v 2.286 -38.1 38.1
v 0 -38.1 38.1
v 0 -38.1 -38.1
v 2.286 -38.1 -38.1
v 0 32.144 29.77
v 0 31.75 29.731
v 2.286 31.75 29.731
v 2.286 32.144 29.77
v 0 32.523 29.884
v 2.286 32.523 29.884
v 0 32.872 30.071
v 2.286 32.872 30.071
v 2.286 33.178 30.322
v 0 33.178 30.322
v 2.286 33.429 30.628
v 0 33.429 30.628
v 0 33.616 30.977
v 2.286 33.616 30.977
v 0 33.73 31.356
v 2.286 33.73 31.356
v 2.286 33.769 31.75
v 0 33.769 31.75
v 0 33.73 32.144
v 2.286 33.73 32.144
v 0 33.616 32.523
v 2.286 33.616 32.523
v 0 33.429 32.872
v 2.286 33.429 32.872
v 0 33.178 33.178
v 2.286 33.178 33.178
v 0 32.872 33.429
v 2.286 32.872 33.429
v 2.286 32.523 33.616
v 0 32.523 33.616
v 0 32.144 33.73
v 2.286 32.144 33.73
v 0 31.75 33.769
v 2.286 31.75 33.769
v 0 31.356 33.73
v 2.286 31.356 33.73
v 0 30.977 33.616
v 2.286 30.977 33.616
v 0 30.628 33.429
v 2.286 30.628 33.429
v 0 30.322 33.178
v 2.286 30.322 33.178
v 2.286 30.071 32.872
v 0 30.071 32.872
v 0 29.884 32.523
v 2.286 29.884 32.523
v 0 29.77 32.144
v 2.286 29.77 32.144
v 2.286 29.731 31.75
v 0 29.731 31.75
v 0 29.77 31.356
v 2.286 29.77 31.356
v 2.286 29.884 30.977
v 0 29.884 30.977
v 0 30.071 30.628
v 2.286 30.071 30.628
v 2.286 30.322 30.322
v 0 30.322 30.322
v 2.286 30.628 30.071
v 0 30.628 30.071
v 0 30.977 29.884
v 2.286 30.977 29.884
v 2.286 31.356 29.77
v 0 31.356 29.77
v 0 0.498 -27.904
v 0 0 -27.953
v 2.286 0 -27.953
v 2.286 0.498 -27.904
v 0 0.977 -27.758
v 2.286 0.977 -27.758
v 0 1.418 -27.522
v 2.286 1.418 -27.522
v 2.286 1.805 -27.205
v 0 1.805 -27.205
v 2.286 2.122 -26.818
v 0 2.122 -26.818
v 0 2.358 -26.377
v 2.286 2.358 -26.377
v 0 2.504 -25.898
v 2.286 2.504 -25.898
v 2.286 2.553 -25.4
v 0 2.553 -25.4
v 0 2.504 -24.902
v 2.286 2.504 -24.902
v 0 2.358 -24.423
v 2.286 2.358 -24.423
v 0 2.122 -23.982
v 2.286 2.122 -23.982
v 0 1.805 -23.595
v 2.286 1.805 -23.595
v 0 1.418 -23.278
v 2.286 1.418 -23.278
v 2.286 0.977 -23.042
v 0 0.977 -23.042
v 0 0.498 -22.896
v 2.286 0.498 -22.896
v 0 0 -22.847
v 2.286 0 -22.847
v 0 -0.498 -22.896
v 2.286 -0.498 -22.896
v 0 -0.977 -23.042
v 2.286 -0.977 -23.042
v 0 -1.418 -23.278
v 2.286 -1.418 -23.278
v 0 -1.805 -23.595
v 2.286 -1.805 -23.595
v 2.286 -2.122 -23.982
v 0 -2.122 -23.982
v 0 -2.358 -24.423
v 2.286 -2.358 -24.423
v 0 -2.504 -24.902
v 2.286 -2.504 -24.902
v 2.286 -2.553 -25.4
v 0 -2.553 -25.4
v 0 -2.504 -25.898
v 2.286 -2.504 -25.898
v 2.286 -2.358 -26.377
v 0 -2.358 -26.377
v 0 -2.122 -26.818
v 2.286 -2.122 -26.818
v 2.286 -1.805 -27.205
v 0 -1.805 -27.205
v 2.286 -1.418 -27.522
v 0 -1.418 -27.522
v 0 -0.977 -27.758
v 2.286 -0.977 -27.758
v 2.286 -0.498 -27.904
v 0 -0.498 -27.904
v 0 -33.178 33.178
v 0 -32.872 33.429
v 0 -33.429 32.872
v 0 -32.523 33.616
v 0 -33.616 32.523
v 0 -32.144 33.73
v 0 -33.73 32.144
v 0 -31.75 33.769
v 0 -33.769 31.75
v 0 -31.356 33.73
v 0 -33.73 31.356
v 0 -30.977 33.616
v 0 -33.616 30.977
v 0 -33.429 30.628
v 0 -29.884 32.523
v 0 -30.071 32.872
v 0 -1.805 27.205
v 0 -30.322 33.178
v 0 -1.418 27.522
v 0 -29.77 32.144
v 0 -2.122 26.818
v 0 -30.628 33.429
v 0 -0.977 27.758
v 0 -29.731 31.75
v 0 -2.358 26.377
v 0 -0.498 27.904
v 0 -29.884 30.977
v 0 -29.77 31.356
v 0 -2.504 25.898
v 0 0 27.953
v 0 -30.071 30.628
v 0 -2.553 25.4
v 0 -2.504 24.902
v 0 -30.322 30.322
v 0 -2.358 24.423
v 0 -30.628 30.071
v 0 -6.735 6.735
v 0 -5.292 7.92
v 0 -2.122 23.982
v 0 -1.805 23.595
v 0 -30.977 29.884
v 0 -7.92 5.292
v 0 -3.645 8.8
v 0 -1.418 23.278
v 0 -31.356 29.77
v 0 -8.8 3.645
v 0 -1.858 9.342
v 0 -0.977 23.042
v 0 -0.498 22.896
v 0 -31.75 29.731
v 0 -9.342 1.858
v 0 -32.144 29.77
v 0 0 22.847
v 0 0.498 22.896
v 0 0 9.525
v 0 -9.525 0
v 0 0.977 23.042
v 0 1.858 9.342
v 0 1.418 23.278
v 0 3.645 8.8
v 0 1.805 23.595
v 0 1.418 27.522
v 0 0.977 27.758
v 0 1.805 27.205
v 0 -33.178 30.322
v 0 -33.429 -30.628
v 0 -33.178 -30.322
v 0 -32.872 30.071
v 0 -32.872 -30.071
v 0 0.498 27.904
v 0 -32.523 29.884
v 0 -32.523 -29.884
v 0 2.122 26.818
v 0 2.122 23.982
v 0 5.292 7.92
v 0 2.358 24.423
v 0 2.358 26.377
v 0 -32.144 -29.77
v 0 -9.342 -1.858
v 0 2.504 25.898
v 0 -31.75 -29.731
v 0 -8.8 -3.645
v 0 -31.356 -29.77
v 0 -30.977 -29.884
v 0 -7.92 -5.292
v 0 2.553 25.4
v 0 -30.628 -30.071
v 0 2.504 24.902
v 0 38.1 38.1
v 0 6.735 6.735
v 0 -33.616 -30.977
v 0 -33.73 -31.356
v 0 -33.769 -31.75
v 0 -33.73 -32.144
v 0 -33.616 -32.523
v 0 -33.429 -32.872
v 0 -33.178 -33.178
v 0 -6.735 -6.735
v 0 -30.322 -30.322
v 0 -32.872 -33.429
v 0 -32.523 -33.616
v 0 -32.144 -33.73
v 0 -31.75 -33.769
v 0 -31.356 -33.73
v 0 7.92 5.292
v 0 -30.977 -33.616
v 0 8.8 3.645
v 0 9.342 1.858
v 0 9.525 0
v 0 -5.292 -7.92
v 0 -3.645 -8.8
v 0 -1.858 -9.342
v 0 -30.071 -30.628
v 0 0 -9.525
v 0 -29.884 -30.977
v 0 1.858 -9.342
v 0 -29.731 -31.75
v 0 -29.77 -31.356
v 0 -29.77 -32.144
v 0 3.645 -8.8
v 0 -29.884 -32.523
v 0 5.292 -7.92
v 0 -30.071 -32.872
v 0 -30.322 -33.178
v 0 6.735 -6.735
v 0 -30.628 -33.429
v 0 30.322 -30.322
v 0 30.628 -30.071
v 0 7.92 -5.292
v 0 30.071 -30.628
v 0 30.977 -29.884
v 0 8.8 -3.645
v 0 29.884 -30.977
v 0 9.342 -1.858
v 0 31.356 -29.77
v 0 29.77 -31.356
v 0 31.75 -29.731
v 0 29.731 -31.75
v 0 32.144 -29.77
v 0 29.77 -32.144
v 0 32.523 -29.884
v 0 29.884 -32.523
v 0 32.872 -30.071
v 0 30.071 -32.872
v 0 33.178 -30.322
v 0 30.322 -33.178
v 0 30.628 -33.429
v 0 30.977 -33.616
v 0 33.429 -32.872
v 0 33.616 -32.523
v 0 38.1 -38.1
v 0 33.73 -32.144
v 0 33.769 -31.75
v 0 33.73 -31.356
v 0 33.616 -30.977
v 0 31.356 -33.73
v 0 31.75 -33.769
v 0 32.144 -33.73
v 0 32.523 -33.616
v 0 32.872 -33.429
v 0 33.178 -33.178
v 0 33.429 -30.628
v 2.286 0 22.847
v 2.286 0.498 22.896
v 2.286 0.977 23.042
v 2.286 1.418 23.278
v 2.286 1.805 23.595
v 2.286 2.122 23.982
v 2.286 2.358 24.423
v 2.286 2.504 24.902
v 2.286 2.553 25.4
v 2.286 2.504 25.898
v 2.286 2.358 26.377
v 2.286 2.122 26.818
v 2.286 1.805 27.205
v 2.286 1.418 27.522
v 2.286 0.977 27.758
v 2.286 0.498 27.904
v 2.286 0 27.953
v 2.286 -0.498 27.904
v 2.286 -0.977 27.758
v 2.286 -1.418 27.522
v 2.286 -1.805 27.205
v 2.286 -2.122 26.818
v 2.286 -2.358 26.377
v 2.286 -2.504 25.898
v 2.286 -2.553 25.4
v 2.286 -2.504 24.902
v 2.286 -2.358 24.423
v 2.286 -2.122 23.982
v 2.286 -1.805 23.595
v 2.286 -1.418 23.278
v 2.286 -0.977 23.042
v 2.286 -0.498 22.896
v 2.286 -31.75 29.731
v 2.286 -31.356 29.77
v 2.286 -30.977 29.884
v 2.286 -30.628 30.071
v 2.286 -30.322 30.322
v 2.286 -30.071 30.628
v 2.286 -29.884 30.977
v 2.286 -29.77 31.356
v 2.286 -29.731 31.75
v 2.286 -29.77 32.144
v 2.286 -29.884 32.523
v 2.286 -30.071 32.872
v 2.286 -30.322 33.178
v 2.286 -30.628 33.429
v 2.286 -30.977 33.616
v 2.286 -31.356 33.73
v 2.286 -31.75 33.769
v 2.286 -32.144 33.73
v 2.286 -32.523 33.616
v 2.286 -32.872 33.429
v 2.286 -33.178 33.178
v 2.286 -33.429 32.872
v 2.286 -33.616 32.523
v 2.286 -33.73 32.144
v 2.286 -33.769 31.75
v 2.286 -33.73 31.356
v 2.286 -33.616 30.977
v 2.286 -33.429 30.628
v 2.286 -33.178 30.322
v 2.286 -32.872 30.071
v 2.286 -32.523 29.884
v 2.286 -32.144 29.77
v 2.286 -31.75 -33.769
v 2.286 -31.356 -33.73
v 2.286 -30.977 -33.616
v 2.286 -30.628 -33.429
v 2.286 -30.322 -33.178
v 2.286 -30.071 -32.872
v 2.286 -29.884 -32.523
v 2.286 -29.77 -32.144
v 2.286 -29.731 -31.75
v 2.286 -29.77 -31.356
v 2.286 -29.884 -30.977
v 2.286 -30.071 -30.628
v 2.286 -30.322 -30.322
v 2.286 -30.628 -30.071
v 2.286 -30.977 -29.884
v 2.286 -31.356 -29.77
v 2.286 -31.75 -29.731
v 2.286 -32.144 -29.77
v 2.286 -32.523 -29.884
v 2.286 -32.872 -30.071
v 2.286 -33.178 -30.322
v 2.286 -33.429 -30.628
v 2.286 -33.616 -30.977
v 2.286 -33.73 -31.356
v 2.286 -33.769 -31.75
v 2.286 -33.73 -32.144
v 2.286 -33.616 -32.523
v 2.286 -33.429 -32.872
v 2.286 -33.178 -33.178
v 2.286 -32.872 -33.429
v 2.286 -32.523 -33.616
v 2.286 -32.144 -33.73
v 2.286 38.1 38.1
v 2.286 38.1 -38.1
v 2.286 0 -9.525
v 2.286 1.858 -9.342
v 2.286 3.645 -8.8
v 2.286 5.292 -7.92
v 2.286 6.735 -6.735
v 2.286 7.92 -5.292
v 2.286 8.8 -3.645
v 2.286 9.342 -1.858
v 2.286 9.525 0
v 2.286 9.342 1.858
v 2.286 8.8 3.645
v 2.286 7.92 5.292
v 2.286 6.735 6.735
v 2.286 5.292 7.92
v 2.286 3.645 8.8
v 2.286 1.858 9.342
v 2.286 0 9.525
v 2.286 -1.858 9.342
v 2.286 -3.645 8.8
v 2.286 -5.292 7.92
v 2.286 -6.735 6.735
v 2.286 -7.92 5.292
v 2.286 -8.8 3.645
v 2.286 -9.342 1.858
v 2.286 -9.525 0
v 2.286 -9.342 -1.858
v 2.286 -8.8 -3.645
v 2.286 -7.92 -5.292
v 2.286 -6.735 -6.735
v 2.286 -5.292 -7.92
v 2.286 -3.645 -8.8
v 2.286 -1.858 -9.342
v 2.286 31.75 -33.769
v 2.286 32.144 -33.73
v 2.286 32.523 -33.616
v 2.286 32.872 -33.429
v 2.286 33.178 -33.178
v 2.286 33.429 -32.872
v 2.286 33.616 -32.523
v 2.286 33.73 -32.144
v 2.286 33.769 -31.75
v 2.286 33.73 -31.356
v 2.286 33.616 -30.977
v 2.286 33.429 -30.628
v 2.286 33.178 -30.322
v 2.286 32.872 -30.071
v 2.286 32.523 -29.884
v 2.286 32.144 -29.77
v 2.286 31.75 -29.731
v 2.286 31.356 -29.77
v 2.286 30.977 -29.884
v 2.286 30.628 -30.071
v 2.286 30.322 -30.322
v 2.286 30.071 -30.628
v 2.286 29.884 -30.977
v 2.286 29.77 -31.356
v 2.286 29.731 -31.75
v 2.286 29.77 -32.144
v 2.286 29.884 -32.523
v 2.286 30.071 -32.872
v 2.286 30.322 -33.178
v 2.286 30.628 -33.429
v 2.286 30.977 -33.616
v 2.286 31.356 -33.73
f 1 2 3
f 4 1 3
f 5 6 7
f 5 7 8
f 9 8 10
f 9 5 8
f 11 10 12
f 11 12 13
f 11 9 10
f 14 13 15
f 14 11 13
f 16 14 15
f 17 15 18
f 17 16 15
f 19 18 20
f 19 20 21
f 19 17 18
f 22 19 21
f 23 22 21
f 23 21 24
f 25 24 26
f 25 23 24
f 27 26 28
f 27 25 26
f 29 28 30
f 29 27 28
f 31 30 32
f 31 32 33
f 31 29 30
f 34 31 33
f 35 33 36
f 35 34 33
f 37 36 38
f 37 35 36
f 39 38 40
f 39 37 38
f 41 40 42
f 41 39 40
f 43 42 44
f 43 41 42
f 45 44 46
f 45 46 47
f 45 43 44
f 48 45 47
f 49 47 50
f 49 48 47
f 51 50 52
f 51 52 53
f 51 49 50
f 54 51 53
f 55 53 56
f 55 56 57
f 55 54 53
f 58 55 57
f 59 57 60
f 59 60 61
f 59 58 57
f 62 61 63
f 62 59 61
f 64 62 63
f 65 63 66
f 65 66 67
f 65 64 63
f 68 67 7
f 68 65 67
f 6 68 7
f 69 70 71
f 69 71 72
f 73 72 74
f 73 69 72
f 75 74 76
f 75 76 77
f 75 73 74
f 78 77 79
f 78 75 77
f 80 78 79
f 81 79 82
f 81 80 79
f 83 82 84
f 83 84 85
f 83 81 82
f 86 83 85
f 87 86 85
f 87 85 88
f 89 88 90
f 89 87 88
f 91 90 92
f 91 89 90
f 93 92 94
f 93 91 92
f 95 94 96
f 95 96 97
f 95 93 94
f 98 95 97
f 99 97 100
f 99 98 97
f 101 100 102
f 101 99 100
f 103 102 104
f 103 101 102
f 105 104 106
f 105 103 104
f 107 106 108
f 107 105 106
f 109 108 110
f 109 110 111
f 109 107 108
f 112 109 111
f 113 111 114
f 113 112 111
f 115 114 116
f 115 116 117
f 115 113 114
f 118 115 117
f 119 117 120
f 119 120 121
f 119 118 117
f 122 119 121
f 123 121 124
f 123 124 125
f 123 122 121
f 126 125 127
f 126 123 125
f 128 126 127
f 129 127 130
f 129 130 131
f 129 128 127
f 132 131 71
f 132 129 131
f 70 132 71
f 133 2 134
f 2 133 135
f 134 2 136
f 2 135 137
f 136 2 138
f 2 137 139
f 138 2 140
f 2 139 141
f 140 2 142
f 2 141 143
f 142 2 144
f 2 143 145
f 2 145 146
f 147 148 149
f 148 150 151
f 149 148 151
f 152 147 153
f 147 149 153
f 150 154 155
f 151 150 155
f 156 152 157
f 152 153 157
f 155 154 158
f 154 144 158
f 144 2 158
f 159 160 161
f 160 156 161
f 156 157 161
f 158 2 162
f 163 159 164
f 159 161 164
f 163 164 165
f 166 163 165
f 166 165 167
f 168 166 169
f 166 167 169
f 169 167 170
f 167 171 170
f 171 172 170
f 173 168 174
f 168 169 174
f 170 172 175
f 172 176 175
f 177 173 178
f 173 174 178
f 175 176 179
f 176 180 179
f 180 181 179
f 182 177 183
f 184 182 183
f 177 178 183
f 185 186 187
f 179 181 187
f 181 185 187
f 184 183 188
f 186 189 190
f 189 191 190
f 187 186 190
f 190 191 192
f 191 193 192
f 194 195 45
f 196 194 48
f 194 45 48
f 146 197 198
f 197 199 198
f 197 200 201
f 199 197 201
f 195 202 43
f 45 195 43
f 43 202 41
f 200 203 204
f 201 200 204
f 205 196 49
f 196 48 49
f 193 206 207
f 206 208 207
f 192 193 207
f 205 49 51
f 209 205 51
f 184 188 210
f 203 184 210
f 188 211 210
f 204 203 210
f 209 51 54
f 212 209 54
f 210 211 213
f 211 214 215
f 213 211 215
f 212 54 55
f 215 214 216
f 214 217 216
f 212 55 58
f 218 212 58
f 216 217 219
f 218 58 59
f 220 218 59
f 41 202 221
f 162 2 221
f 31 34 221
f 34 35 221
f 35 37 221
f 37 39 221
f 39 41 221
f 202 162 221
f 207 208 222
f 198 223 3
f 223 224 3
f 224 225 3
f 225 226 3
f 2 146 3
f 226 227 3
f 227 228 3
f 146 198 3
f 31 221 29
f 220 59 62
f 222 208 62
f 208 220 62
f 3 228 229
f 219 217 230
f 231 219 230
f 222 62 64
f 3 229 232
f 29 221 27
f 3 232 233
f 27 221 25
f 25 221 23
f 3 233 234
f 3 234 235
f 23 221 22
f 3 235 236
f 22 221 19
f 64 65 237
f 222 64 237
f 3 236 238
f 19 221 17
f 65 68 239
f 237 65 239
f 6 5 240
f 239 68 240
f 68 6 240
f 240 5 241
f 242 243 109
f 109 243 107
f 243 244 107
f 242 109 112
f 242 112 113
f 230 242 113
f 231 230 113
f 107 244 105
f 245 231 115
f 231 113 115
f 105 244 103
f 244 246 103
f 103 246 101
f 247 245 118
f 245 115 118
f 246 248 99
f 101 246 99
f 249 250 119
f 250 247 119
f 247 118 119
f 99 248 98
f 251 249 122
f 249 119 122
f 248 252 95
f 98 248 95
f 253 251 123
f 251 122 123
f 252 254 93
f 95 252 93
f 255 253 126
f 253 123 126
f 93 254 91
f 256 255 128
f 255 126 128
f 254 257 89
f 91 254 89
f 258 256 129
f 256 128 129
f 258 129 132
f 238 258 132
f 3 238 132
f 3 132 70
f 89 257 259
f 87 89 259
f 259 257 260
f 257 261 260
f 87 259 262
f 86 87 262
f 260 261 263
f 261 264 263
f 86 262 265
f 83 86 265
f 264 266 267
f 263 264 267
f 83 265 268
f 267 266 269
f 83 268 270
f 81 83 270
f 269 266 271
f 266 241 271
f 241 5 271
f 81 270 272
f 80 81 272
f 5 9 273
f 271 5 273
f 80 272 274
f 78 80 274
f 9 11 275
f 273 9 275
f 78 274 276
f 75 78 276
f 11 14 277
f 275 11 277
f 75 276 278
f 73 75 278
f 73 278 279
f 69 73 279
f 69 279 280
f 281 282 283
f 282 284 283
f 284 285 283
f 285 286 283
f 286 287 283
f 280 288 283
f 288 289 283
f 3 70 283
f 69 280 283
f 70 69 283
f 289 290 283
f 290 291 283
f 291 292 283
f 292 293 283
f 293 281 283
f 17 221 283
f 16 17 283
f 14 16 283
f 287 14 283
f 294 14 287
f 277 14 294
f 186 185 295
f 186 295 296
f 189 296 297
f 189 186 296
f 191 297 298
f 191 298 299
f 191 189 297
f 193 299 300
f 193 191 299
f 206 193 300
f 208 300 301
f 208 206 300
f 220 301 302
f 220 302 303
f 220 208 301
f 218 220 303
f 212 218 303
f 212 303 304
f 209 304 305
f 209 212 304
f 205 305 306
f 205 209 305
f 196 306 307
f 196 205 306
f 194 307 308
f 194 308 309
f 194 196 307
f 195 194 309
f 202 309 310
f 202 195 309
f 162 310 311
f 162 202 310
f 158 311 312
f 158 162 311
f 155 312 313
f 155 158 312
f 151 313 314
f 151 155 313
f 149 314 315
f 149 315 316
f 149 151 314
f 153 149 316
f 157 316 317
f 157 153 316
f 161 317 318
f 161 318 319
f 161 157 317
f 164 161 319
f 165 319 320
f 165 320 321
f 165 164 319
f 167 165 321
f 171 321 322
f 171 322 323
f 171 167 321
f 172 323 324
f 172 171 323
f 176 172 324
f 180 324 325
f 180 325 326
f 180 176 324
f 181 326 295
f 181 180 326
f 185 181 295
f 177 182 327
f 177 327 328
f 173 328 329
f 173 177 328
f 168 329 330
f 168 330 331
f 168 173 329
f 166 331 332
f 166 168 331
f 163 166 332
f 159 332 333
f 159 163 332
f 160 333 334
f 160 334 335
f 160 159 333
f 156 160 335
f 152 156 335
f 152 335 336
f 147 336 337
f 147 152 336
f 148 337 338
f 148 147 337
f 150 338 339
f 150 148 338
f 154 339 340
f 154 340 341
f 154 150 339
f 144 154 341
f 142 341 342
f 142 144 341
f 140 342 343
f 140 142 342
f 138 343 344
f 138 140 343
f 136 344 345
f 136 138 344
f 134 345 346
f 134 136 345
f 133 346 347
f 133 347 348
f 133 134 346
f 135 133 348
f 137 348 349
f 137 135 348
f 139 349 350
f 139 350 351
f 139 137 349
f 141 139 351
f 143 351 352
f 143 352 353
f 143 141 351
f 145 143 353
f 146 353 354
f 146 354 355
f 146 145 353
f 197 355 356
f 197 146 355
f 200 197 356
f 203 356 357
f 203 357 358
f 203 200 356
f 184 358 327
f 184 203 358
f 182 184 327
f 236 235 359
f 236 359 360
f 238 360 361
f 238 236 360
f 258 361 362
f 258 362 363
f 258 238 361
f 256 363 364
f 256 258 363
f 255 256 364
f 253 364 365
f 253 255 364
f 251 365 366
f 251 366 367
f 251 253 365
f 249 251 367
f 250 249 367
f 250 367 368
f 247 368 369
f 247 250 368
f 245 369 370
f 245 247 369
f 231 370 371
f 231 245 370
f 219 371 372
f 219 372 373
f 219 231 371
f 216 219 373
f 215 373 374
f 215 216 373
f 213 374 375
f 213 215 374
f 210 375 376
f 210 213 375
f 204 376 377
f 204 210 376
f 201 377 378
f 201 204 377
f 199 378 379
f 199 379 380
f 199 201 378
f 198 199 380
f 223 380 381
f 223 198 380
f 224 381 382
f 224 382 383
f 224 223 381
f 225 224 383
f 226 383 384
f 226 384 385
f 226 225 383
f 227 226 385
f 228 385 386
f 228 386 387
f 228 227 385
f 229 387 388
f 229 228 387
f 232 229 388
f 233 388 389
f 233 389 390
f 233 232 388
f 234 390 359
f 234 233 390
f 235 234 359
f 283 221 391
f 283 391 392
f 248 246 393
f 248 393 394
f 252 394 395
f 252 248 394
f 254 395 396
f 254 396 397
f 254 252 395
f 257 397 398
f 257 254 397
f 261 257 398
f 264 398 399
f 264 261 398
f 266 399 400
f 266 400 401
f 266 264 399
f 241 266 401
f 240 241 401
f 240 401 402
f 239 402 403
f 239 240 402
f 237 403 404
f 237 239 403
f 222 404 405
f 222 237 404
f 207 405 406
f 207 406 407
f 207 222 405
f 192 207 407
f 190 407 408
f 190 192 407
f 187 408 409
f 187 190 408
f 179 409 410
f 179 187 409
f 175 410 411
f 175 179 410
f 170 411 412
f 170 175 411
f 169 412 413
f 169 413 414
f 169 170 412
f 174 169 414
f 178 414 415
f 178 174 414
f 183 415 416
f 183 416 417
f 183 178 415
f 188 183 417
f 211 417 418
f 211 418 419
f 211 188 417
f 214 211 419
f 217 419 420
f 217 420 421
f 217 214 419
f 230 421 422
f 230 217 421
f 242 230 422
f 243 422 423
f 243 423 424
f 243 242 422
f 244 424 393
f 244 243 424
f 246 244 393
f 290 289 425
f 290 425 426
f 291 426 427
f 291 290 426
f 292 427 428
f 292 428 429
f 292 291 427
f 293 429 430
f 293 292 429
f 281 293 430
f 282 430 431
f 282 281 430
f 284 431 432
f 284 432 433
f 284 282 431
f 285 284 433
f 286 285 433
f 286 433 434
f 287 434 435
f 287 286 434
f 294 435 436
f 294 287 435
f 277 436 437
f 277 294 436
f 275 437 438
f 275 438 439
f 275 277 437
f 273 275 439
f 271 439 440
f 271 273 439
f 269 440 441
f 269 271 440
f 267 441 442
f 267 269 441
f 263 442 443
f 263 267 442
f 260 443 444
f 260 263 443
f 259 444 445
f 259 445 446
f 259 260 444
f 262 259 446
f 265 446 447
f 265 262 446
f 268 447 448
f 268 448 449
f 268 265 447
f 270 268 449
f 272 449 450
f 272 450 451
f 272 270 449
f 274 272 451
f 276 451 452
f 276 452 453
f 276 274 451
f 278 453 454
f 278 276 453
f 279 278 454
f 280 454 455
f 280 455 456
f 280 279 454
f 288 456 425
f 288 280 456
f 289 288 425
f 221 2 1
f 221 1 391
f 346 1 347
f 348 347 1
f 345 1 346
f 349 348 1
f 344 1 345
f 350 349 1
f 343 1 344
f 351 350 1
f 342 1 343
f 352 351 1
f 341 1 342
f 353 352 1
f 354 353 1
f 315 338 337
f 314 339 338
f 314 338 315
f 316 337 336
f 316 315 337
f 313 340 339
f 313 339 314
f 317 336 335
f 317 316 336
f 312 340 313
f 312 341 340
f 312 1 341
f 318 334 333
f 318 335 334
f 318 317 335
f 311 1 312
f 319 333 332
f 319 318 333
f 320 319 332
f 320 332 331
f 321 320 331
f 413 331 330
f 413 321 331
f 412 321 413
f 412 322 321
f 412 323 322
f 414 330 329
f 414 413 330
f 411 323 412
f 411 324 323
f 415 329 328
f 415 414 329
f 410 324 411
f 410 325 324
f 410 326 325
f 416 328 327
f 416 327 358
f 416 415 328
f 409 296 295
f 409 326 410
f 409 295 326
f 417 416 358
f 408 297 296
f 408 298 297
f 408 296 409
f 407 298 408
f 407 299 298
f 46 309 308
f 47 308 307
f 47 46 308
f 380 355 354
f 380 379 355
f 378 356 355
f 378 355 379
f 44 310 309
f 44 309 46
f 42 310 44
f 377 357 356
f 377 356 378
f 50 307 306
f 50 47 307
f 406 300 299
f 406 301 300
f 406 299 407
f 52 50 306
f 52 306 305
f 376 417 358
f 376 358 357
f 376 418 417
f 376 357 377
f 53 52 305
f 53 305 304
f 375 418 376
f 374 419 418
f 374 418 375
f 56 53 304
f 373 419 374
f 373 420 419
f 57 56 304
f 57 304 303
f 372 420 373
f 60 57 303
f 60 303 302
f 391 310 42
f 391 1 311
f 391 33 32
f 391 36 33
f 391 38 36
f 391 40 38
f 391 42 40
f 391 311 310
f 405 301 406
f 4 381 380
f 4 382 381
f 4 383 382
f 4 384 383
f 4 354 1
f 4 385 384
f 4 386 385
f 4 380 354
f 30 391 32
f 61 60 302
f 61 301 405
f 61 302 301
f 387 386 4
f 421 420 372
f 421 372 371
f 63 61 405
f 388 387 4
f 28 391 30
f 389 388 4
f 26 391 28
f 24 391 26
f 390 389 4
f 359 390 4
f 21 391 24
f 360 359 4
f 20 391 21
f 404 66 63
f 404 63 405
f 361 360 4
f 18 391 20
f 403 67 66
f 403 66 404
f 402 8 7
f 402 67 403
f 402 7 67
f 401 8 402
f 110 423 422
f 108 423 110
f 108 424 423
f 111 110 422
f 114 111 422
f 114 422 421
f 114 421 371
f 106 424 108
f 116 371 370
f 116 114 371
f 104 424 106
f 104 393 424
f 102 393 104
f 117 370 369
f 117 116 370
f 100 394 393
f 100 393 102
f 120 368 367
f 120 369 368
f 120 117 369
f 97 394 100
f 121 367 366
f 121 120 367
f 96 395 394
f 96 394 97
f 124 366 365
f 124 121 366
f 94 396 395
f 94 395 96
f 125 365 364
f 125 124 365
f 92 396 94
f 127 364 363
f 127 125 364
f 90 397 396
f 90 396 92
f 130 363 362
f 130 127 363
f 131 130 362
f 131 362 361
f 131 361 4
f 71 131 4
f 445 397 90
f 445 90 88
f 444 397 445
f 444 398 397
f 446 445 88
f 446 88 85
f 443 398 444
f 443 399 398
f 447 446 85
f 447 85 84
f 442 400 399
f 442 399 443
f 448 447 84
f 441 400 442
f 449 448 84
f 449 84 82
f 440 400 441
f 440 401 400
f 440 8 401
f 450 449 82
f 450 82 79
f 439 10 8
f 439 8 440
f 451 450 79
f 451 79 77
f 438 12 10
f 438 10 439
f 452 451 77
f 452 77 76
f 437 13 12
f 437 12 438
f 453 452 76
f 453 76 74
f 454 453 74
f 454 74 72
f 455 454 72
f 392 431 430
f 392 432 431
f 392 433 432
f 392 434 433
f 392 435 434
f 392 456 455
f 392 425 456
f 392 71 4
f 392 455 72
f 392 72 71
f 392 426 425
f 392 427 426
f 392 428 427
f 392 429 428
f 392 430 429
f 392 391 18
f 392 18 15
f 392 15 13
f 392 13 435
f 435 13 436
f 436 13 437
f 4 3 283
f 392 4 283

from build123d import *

# Parameters (mm, degrees)
SKETCH1_W           = 76.2
SKETCH1_H           = 76.2
SKETCH1_R           = 2.5527
SKETCH1_R_2         = 2.0193
SKETCH1_R_3         = 9.525
BOSS_EXTRUDE1_DEPTH = 2.286


with BuildPart() as part:
    # Sketch1 → Boss-Extrude1 (new body)
    with BuildSketch(Plane(origin=(0, 0, 0), x_dir=(0, 0, -1), z_dir=(1, 0, 0))):
        Rectangle(SKETCH1_W, SKETCH1_H)
        with Locations((-25.4, 0)):
            Circle(SKETCH1_R, mode=Mode.SUBTRACT)
        with Locations((-31.75, 31.75)):
            Circle(SKETCH1_R_2, mode=Mode.SUBTRACT)
        Circle(SKETCH1_R_3, mode=Mode.SUBTRACT)
        with Locations((25.4, 0)):
            Circle(SKETCH1_R, mode=Mode.SUBTRACT)
        with Locations((31.75, 31.75)):
            Circle(SKETCH1_R_2, mode=Mode.SUBTRACT)
        with Locations((31.75, -31.75)):
            Circle(SKETCH1_R_2, mode=Mode.SUBTRACT)
        with Locations((-31.75, -31.75)):
            Circle(SKETCH1_R_2, mode=Mode.SUBTRACT)
    extrude(amount=BOSS_EXTRUDE1_DEPTH)


solid = part.part
